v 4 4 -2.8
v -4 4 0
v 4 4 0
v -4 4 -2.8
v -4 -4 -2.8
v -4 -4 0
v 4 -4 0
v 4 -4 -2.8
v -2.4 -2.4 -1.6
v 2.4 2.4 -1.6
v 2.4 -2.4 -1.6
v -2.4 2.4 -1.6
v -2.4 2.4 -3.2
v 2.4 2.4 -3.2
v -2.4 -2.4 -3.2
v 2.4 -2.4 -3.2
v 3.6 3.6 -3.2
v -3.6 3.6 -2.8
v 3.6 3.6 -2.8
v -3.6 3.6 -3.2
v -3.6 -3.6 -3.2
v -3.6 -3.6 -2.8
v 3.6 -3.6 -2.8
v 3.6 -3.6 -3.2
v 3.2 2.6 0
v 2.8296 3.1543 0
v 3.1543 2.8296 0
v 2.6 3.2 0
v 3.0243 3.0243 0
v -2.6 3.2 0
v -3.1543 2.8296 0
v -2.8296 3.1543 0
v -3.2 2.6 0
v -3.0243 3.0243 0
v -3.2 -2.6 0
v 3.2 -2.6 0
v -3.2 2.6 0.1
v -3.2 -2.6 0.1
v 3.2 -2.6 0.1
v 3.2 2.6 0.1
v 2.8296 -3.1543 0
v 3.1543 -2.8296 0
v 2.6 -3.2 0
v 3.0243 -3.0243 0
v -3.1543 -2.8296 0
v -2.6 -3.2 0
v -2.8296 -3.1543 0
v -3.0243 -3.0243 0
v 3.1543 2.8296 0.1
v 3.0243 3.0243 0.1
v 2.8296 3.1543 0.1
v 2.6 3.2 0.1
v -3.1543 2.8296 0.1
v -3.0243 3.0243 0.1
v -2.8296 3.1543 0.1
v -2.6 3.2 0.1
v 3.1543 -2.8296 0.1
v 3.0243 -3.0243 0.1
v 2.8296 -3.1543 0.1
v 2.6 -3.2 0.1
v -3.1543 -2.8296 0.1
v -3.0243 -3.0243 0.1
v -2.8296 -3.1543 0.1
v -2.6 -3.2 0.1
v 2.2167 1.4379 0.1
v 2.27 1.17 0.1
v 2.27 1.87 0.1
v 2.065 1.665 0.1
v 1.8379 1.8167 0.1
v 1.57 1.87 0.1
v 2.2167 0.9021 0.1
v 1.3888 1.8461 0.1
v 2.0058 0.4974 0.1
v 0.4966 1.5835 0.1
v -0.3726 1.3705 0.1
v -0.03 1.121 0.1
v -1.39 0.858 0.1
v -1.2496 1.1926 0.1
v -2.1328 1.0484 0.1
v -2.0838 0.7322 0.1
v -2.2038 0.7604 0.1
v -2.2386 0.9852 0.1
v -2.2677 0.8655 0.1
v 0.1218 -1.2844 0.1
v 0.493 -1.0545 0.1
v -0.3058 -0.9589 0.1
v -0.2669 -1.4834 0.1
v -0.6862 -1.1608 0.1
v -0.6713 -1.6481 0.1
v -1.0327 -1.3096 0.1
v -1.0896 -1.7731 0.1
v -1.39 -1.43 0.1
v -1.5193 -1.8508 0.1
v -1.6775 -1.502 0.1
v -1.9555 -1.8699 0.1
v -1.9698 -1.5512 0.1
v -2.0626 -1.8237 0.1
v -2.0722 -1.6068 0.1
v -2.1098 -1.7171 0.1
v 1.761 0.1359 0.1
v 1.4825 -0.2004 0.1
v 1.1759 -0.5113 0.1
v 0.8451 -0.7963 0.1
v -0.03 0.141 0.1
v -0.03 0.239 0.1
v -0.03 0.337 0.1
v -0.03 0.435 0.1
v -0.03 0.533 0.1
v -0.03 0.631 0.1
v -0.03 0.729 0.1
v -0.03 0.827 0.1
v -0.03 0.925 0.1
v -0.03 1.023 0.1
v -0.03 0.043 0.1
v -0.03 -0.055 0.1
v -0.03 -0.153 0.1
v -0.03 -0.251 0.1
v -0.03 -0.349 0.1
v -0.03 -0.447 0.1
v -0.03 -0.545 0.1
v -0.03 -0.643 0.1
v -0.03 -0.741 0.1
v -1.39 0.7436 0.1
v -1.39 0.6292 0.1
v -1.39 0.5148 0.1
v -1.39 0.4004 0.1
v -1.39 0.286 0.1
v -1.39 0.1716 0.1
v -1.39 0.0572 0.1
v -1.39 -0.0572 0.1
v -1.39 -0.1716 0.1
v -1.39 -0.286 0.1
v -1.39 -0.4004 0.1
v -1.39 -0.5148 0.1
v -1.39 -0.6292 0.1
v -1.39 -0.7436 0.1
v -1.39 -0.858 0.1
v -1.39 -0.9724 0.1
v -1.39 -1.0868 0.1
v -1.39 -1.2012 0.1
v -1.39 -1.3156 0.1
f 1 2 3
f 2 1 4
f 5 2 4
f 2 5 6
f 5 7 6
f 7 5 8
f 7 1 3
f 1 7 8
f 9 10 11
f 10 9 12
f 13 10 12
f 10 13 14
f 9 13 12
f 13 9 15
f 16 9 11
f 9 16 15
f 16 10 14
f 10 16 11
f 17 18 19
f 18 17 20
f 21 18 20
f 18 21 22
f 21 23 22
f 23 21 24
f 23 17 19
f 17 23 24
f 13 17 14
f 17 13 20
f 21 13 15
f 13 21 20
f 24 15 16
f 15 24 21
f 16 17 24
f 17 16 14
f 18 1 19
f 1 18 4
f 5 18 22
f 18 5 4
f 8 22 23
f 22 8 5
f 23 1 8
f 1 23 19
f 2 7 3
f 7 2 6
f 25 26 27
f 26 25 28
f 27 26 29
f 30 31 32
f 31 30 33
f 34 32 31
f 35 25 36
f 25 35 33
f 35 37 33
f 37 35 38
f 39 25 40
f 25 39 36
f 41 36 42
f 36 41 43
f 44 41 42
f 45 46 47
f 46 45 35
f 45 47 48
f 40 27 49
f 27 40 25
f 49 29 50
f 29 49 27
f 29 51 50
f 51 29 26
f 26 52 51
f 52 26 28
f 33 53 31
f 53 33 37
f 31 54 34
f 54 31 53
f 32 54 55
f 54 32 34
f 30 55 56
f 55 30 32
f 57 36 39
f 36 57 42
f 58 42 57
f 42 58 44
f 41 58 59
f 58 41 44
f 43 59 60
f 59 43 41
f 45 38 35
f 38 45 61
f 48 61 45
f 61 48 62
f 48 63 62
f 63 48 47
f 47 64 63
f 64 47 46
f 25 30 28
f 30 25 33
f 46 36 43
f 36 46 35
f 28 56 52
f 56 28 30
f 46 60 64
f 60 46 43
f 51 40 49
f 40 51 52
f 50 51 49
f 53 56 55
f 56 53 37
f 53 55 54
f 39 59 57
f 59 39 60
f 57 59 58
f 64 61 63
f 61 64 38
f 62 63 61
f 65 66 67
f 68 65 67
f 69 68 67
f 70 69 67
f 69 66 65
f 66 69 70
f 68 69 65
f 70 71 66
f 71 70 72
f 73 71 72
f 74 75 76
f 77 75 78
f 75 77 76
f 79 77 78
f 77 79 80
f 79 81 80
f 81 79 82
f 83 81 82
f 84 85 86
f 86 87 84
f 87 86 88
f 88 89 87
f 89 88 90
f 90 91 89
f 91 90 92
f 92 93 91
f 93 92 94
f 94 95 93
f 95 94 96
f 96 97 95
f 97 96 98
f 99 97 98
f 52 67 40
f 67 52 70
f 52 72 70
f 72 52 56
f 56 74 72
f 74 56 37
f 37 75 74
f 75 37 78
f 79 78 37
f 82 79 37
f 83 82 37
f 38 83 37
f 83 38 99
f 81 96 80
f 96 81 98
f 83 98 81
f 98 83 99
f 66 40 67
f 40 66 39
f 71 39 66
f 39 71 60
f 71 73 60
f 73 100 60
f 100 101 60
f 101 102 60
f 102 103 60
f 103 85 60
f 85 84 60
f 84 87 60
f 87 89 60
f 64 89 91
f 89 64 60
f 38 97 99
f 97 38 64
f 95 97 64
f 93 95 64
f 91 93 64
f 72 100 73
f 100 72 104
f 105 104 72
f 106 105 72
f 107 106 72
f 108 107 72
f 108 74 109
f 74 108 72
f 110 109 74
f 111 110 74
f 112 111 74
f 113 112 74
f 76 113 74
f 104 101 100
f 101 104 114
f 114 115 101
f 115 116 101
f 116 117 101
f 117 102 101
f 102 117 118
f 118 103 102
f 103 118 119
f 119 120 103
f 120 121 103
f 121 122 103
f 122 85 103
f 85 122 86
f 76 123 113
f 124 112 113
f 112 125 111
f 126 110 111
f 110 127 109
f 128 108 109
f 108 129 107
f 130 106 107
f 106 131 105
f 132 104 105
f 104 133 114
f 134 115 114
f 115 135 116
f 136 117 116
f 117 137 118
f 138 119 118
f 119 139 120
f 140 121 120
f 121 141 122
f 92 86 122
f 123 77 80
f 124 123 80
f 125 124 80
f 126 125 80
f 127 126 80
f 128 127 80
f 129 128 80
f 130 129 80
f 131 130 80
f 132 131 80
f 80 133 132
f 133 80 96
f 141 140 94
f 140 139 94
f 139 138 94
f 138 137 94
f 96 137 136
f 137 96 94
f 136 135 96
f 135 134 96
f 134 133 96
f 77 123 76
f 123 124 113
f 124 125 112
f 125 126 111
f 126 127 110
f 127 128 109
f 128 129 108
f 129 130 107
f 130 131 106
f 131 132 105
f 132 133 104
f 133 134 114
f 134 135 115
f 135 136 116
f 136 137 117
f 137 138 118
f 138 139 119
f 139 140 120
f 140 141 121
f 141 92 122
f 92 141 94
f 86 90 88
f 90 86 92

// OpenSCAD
// file: ../p/box3u12.scad
use <../lib.scad>
function ldraw_lib__box3u12() = [
// 0 Box with 3 Parallel Faces without Any Edges
// 0 Name: box3u12.dat
// 0 Author: J.C. Tchang [tchang]
// 0 !LDRAW_ORG Primitive UPDATE 2014-02
// 0 !LICENSE Licensed under CC BY 4.0 : see CAreadme.txt
// 
// 0 BFC CERTIFY CCW
  [0,"BFC","CERTIFY"],
  [0,"BFC","CCW"],
// 
// 0 !HISTORY 2014-12-23 [PTadmin] Official Update 2014-02
// 
// 
// 4 16 -1 1 1 1 1 1 1 1 -1 -1 1 -1
  [4,16,-1,1,1,1,1,1,1,1,-1,-1,1,-1],
// 4 16 -1 1 1 -1 0 1 1 0 1 1 1 1
  [4,16,-1,1,1,-1,0,1,1,0,1,1,1,1],
// 4 16 1 1 -1 1 0 -1 -1 0 -1 -1 1 -1
  [4,16,1,1,-1,1,0,-1,-1,0,-1,-1,1,-1],
];
module ldraw_lib__box3u12(step=0, col=false, unit=2/5, alt=false, line=0.2, solid=!$preview)
    makepoly(ldraw_lib__box3u12(), step=step, col=col, unit=unit, alt=alt, line=line, solid=solid);
ldraw_lib__box3u12(line=0.2);
// file: ../p/1-4cyli.scad
use <../lib.scad>
function ldraw_lib__1_4cyli() = [
// 0 Cylinder 0.25
// 0 Name: 1-4cyli.dat
// 0 Author: James Jessiman
// 0 !LDRAW_ORG Primitive UPDATE 2012-01
// 0 !LICENSE Licensed under CC BY 4.0 : see CAreadme.txt
// 
// 0 BFC CERTIFY CCW
  [0,"BFC","CERTIFY"],
  [0,"BFC","CCW"],
// 
// 0 !HISTORY 2002-03-23 [sbliss] Added BFC statement.
// 0 !HISTORY 2002-04-25 [PTadmin] Official Update 2002-02
// 0 !HISTORY 2007-06-22 [PTadmin] Header formatted for Contributor Agreement
// 0 !HISTORY 2008-07-01 [PTadmin] Official Update 2008-01
// 0 !HISTORY 2012-02-16 [Philo] Changed to CCW
// 0 !HISTORY 2012-03-30 [PTadmin] Official Update 2012-01
// 
// 
// 4 16 1 1 0 0.9239 1 0.3827 0.9239 0 0.3827 1 0 0
  [4,16,1,1,0,0.9239,1,0.3827,0.9239,0,0.3827,1,0,0],
// 5 24 1 0 0 1 1 0 0.9239 0 0.3827 1 0 -1
  [5,24,1,0,0,1,1,0,0.9239,0,0.3827,1,0,-1],
// 4 16 0.9239 1 0.3827 0.7071 1 0.7071 0.7071 0 0.7071 0.9239 0 0.3827
  [4,16,0.9239,1,0.3827,0.7071,1,0.7071,0.7071,0,0.7071,0.9239,0,0.3827],
// 5 24 0.9239 0 0.3827 0.9239 1 0.3827 0.7071 0 0.7071 1 0 0
  [5,24,0.9239,0,0.3827,0.9239,1,0.3827,0.7071,0,0.7071,1,0,0],
// 4 16 0.7071 1 0.7071 0.3827 1 0.9239 0.3827 0 0.9239 0.7071 0 0.7071
  [4,16,0.7071,1,0.7071,0.3827,1,0.9239,0.3827,0,0.9239,0.7071,0,0.7071],
// 5 24 0.7071 0 0.7071 0.7071 1 0.7071 0.3827 0 0.9239 0.9239 0 0.3827
  [5,24,0.7071,0,0.7071,0.7071,1,0.7071,0.3827,0,0.9239,0.9239,0,0.3827],
// 4 16 0.3827 1 0.9239 0 1 1 0 0 1 0.3827 0 0.9239
  [4,16,0.3827,1,0.9239,0,1,1,0,0,1,0.3827,0,0.9239],
// 5 24 0.3827 0 0.9239 0.3827 1 0.9239 0 0 1 0.7071 0 0.7071
  [5,24,0.3827,0,0.9239,0.3827,1,0.9239,0,0,1,0.7071,0,0.7071],
// 5 24 0 0 1 0 1 1 0.3827 0 0.9239 -1 0 1
  [5,24,0,0,1,0,1,1,0.3827,0,0.9239,-1,0,1],
];
module ldraw_lib__1_4cyli(step=0, col=false, unit=2/5, alt=false, line=0.2, solid=!$preview)
    makepoly(ldraw_lib__1_4cyli(), step=step, col=col, unit=unit, alt=alt, line=line, solid=solid);
ldraw_lib__1_4cyli(line=0.2);
// file: s/stickerback008x008.scad
use <../../lib.scad>
use <../../p/1-4chrd.scad>
use <../../p/1-4cyli.scad>
use <../../p/box3u12.scad>
function ldraw_lib__s__stickerback008x008() = [
// 0 ~Sticker Back  0.8 x  0.8
// 0 Name: s\stickerback008x008.dat
// 0 Author: Massimo Maso [Sirio]
// 0 !LDRAW_ORG Subpart UPDATE 2025-08
// 0 !LICENSE Licensed under CC BY 4.0 : see CAreadme.txt
// 
// 0 BFC CERTIFY CCW
  [0,"BFC","CERTIFY"],
  [0,"BFC","CCW"],
// 
// 0 !HISTORY 2025-08-31 [OrionP] Official Update 2025-08
// 
// 0 // Primitives
// 1 16 -6.5 0 6.5 -1.5 0 0 0 -1 0 0 0 1.5 1-4chrd.dat
  [1,16,-6.5,0,6.5,-1.5,0,0,0,-1,0,0,0,1.5, ldraw_lib__1_4chrd()],
// 1 16 6.5 0 6.5 1.5 0 0 0 -1 0 0 0 1.5 1-4chrd.dat
  [1,16,6.5,0,6.5,1.5,0,0,0,-1,0,0,0,1.5, ldraw_lib__1_4chrd()],
// 1 16 0 -.25 0 0 0 8 0 .25 0 6.5 0 0 box3u12.dat
  [1,16,0,-.25,0,0,0,8,0,.25,0,6.5,0,0, ldraw_lib__box3u12()],
// 1 16 -6.5 0 -6.5 -1.5 0 0 0 -1 0 0 0 -1.5 1-4chrd.dat
  [1,16,-6.5,0,-6.5,-1.5,0,0,0,-1,0,0,0,-1.5, ldraw_lib__1_4chrd()],
// 1 16 6.5 0 -6.5 1.5 0 0 0 -1 0 0 0 -1.5 1-4chrd.dat
  [1,16,6.5,0,-6.5,1.5,0,0,0,-1,0,0,0,-1.5, ldraw_lib__1_4chrd()],
// 1 16 -6.5 0 6.5 -1.5 0 0 0 -.25 0 0 0 1.5 1-4cyli.dat
  [1,16,-6.5,0,6.5,-1.5,0,0,0,-.25,0,0,0,1.5, ldraw_lib__1_4cyli()],
// 1 16 6.5 0 6.5 1.5 0 0 0 -.25 0 0 0 1.5 1-4cyli.dat
  [1,16,6.5,0,6.5,1.5,0,0,0,-.25,0,0,0,1.5, ldraw_lib__1_4cyli()],
// 1 16 -6.5 0 -6.5 -1.5 0 0 0 -.25 0 0 0 -1.5 1-4cyli.dat
  [1,16,-6.5,0,-6.5,-1.5,0,0,0,-.25,0,0,0,-1.5, ldraw_lib__1_4cyli()],
// 1 16 6.5 0 -6.5 1.5 0 0 0 -.25 0 0 0 -1.5 1-4cyli.dat
  [1,16,6.5,0,-6.5,1.5,0,0,0,-.25,0,0,0,-1.5, ldraw_lib__1_4cyli()],
// 0 // Bottom faces
// 4 16 -8 0 6.5 -6.5 0 8 6.5 0 8 8 0 6.5
  [4,16,-8,0,6.5,-6.5,0,8,6.5,0,8,8,0,6.5],
// 4 16 -8 0 -6.5 8 0 -6.5 6.5 0 -8 -6.5 0 -8
  [4,16,-8,0,-6.5,8,0,-6.5,6.5,0,-8,-6.5,0,-8],
// 0 // Lateral faces
// 4 16 -6.5 0 8 -6.5 -.25 8 6.5 -.25 8 6.5 0 8
  [4,16,-6.5,0,8,-6.5,-.25,8,6.5,-.25,8,6.5,0,8],
// 4 16 -6.5 0 -8 6.5 0 -8 6.5 -.25 -8 -6.5 -.25 -8
  [4,16,-6.5,0,-8,6.5,0,-8,6.5,-.25,-8,-6.5,-.25,-8],
];
module ldraw_lib__s__stickerback008x008(step=0, col=false, unit=2/5, alt=false, line=0.2, solid=!$preview)
    makepoly(ldraw_lib__s__stickerback008x008(), step=step, col=col, unit=unit, alt=alt, line=line, solid=solid);
ldraw_lib__s__stickerback008x008(line=0.2);
// file: ../p/1-4ndis.scad
use <../lib.scad>
function ldraw_lib__1_4ndis() = [
// 0 Disc Negative 0.25
// 0 Name: 1-4ndis.dat
// 0 Author: James Jessiman
// 0 !LDRAW_ORG Primitive UPDATE 2012-01
// 0 !LICENSE Licensed under CC BY 4.0 : see CAreadme.txt
// 
// 0 BFC CERTIFY CCW
  [0,"BFC","CERTIFY"],
  [0,"BFC","CCW"],
// 
// 0 !HISTORY 2002-03-23 [sbliss] Added BFC Statement
// 0 !HISTORY 2002-04-25 [PTadmin] Official Update 2002-02
// 0 !HISTORY 2007-06-22 [PTadmin] Header formatted for Contributor Agreement
// 0 !HISTORY 2008-07-01 [PTadmin] Official Update 2008-01
// 0 !HISTORY 2012-02-16 [Philo] Changed to CCW
// 0 !HISTORY 2012-03-30 [PTadmin] Official Update 2012-01
// 
// 
// 3 16 0.9239 0 0.3827 1 0 0 1 0 1
  [3,16,0.9239,0,0.3827,1,0,0,1,0,1],
// 3 16 0.7071 0 0.7071 0.9239 0 0.3827 1 0 1
  [3,16,0.7071,0,0.7071,0.9239,0,0.3827,1,0,1],
// 3 16 0.3827 0 0.9239 0.7071 0 0.7071 1 0 1
  [3,16,0.3827,0,0.9239,0.7071,0,0.7071,1,0,1],
// 3 16 0 0 1 0.3827 0 0.9239 1 0 1
  [3,16,0,0,1,0.3827,0,0.9239,1,0,1],
];
module ldraw_lib__1_4ndis(step=0, col=false, unit=2/5, alt=false, line=0.2, solid=!$preview)
    makepoly(ldraw_lib__1_4ndis(), step=step, col=col, unit=unit, alt=alt, line=line, solid=solid);
ldraw_lib__1_4ndis(line=0.2);
// file: ../p/1-4chrd.scad
use <../lib.scad>
function ldraw_lib__1_4chrd() = [
// 0 Chord 0.25
// 0 Name: 1-4chrd.dat
// 0 Author: Max Martin Richter [MMR1988]
// 0 !LDRAW_ORG Primitive UPDATE 2023-05
// 0 !LICENSE Licensed under CC BY 4.0 : see CAreadme.txt
// 
// 0 BFC CERTIFY CCW
  [0,"BFC","CERTIFY"],
  [0,"BFC","CCW"],
// 
// 0 !HISTORY 2004-04-22 [PTadmin] Official Update 2004-02
// 0 !HISTORY 2007-10-09 [PTadmin] Header formatted for Contributor Agreement
// 0 !HISTORY 2008-07-01 [PTadmin] Official Update 2008-01
// 0 !HISTORY 2012-08-02 [MMR1988] Re-creation with PrimGen2 and Rectifier
// 0 !HISTORY 2012-08-09 [PTadmin] Official Update 2012-02
// 0 !HISTORY 2023-10-27 [OrionP] Change author to MMR1988 from hafhead
// 0 !HISTORY 2023-10-31 [OrionP] Official Update 2023-05
// 
// 4 16 0.9239 0 0.3827 0.3827 0 0.9239 0 0 1 1 0 0
  [4,16,0.9239,0,0.3827,0.3827,0,0.9239,0,0,1,1,0,0],
// 3 16 0.7071 0 0.7071 0.3827 0 0.9239 0.9239 0 0.3827
  [3,16,0.7071,0,0.7071,0.3827,0,0.9239,0.9239,0,0.3827],
];
module ldraw_lib__1_4chrd(step=0, col=false, unit=2/5, alt=false, line=0.2, solid=!$preview)
    makepoly(ldraw_lib__1_4chrd(), step=step, col=col, unit=unit, alt=alt, line=line, solid=solid);
ldraw_lib__1_4chrd(line=0.2);
// file: ../p/box5.scad
use <../lib.scad>
function ldraw_lib__box5() = [
// 0 Box with 5 Faces and All Edges
// 0 Name: box5.dat
// 0 Author: James Jessiman
// 0 !LDRAW_ORG Primitive UPDATE 2012-01
// 0 !LICENSE Licensed under CC BY 4.0 : see CAreadme.txt
// 
// 0 BFC CERTIFY CCW
  [0,"BFC","CERTIFY"],
  [0,"BFC","CCW"],
// 
// 0 !HISTORY 2002-04-03 [sbliss] Modified for BFC compliance
// 0 !HISTORY 2002-04-25 [PTadmin] Official Update 2002-02
// 0 !HISTORY 2007-06-24 [PTadmin] Header formatted for Contributor Agreement
// 0 !HISTORY 2008-07-01 [PTadmin] Official Update 2008-01
// 0 !HISTORY 2012-02-16 [Philo] Changed to CCW
// 0 !HISTORY 2012-03-30 [PTadmin] Official Update 2012-01
// 
// 
// 2 24 1 1 1 -1 1 1
  [2,24,1,1,1,-1,1,1],
// 2 24 -1 1 1 -1 1 -1
  [2,24,-1,1,1,-1,1,-1],
// 2 24 -1 1 -1 1 1 -1
  [2,24,-1,1,-1,1,1,-1],
// 2 24 1 1 -1 1 1 1
  [2,24,1,1,-1,1,1,1],
// 2 24 1 0 1 -1 0 1
  [2,24,1,0,1,-1,0,1],
// 2 24 -1 0 1 -1 0 -1
  [2,24,-1,0,1,-1,0,-1],
// 2 24 -1 0 -1 1 0 -1
  [2,24,-1,0,-1,1,0,-1],
// 2 24 1 0 -1 1 0 1
  [2,24,1,0,-1,1,0,1],
// 2 24 1 0 1 1 1 1
  [2,24,1,0,1,1,1,1],
// 2 24 -1 0 1 -1 1 1
  [2,24,-1,0,1,-1,1,1],
// 2 24 1 0 -1 1 1 -1
  [2,24,1,0,-1,1,1,-1],
// 2 24 -1 0 -1 -1 1 -1
  [2,24,-1,0,-1,-1,1,-1],
// 4 16 -1 1 1 1 1 1 1 1 -1 -1 1 -1
  [4,16,-1,1,1,1,1,1,1,1,-1,-1,1,-1],
// 4 16 -1 1 1 -1 0 1 1 0 1 1 1 1
  [4,16,-1,1,1,-1,0,1,1,0,1,1,1,1],
// 4 16 -1 1 -1 -1 0 -1 -1 0 1 -1 1 1
  [4,16,-1,1,-1,-1,0,-1,-1,0,1,-1,1,1],
// 4 16 1 1 -1 1 0 -1 -1 0 -1 -1 1 -1
  [4,16,1,1,-1,1,0,-1,-1,0,-1,-1,1,-1],
// 4 16 1 1 1 1 0 1 1 0 -1 1 1 -1
  [4,16,1,1,1,1,0,1,1,0,-1,1,1,-1],
];
module ldraw_lib__box5(step=0, col=false, unit=2/5, alt=false, line=0.2, solid=!$preview)
    makepoly(ldraw_lib__box5(), step=step, col=col, unit=unit, alt=alt, line=line, solid=solid);
ldraw_lib__box5(line=0.2);
// file: ../p/box4.scad
use <../lib.scad>
function ldraw_lib__box4() = [
// 0 Box with 4 Faces (2 Parallel Pairs) and All Edges
// 0 Name: box4.dat
// 0 Author: James Jessiman
// 0 !LDRAW_ORG Primitive UPDATE 2012-01
// 0 !LICENSE Licensed under CC BY 4.0 : see CAreadme.txt
// 
// 0 BFC CERTIFY CCW
  [0,"BFC","CERTIFY"],
  [0,"BFC","CCW"],
// 
// 0 !HISTORY 2002-04-03 [sbliss] Modified for BFC compliance
// 0 !HISTORY 2002-04-25 [PTadmin] Official Update 2002-02
// 0 !HISTORY 2007-06-24 [PTadmin] Header formatted for Contributor Agreement
// 0 !HISTORY 2008-07-01 [PTadmin] Official Update 2008-01
// 0 !HISTORY 2012-02-16 [Philo] Changed to CCW
// 0 !HISTORY 2012-03-30 [PTadmin] Official Update 2012-01
// 
// 
// 2 24 1 1 1 -1 1 1
  [2,24,1,1,1,-1,1,1],
// 2 24 -1 1 1 -1 1 -1
  [2,24,-1,1,1,-1,1,-1],
// 2 24 -1 1 -1 1 1 -1
  [2,24,-1,1,-1,1,1,-1],
// 2 24 1 1 -1 1 1 1
  [2,24,1,1,-1,1,1,1],
// 2 24 1 0 1 -1 0 1
  [2,24,1,0,1,-1,0,1],
// 2 24 -1 0 1 -1 0 -1
  [2,24,-1,0,1,-1,0,-1],
// 2 24 -1 0 -1 1 0 -1
  [2,24,-1,0,-1,1,0,-1],
// 2 24 1 0 -1 1 0 1
  [2,24,1,0,-1,1,0,1],
// 2 24 1 0 1 1 1 1
  [2,24,1,0,1,1,1,1],
// 2 24 -1 0 1 -1 1 1
  [2,24,-1,0,1,-1,1,1],
// 2 24 1 0 -1 1 1 -1
  [2,24,1,0,-1,1,1,-1],
// 2 24 -1 0 -1 -1 1 -1
  [2,24,-1,0,-1,-1,1,-1],
// 4 16 -1 1 1 -1 0 1 1 0 1 1 1 1
  [4,16,-1,1,1,-1,0,1,1,0,1,1,1,1],
// 4 16 -1 1 -1 -1 0 -1 -1 0 1 -1 1 1
  [4,16,-1,1,-1,-1,0,-1,-1,0,1,-1,1,1],
// 4 16 1 1 -1 1 0 -1 -1 0 -1 -1 1 -1
  [4,16,1,1,-1,1,0,-1,-1,0,-1,-1,1,-1],
// 4 16 1 1 1 1 0 1 1 0 -1 1 1 -1
  [4,16,1,1,1,1,0,1,1,0,-1,1,1,-1],
];
module ldraw_lib__box4(step=0, col=false, unit=2/5, alt=false, line=0.2, solid=!$preview)
    makepoly(ldraw_lib__box4(), step=step, col=col, unit=unit, alt=alt, line=line, solid=solid);
ldraw_lib__box4(line=0.2);
// file: s/3070bs01.scad
use <../../lib.scad>
use <../../p/box4.scad>
use <../../p/box5.scad>
function ldraw_lib__s__3070bs01() = [
// 0 ~Tile  1 x  1 with Groove without Top Face
// 0 Name: s\3070bs01.dat
// 0 Author: Chris Dee [cwdee]
// 0 !LDRAW_ORG Subpart UPDATE 2009-02
// 0 !LICENSE Licensed under CC BY 4.0 : see CAreadme.txt
// 
// 0 BFC CERTIFY CCW
  [0,"BFC","CERTIFY"],
  [0,"BFC","CCW"],
// 
// 0 !HISTORY 2009-09-03 [PTadmin] Official Update 2009-02
// 
// 
// 1 16 0 0 0 10 0 0 0 7 0 0 0 10 box4.dat
  [1,16,0,0,0,10,0,0,0,7,0,0,0,10, ldraw_lib__box4()],
// 0 BFC INVERTNEXT
  [0,"BFC","INVERTNEXT"],
// 1 16 0 8 0 6 0 0 0 -4 0 0 0 6 box5.dat
  [1,16,0,8,0,6,0,0,0,-4,0,0,0,6, ldraw_lib__box5()],
// 1 16 0 7 0 9 0 0 0 1 0 0 0 9 box4.dat
  [1,16,0,7,0,9,0,0,0,1,0,0,0,9, ldraw_lib__box4()],
// 
// 4 16 9 8 9 6 8 6 -6 8 6 -9 8 9
  [4,16,9,8,9,6,8,6,-6,8,6,-9,8,9],
// 4 16 -9 8 9 -6 8 6 -6 8 -6 -9 8 -9
  [4,16,-9,8,9,-6,8,6,-6,8,-6,-9,8,-9],
// 4 16 -9 8 -9 -6 8 -6 6 8 -6 9 8 -9
  [4,16,-9,8,-9,-6,8,-6,6,8,-6,9,8,-9],
// 4 16 9 8 -9 6 8 -6 6 8 6 9 8 9
  [4,16,9,8,-9,6,8,-6,6,8,6,9,8,9],
// 
// 4 16 10 7 10 9 7 9 -9 7 9 -10 7 10
  [4,16,10,7,10,9,7,9,-9,7,9,-10,7,10],
// 4 16 -10 7 10 -9 7 9 -9 7 -9 -10 7 -10
  [4,16,-10,7,10,-9,7,9,-9,7,-9,-10,7,-10],
// 4 16 -10 7 -10 -9 7 -9 9 7 -9 10 7 -10
  [4,16,-10,7,-10,-9,7,-9,9,7,-9,10,7,-10],
// 4 16 10 7 -10 9 7 -9 9 7 9 10 7 10
  [4,16,10,7,-10,9,7,-9,9,7,9,10,7,10],
// 0
];
module ldraw_lib__s__3070bs01(step=0, col=false, unit=2/5, alt=false, line=0.2, solid=!$preview)
    makepoly(ldraw_lib__s__3070bs01(), step=step, col=col, unit=unit, alt=alt, line=line, solid=solid);
ldraw_lib__s__3070bs01(line=0.2);
// file: 6177960j.scad
use <../lib.scad>
use <6177960g.scad>
function ldraw_lib__6177960j() = [
// 0 Sticker  0.8 x  0.8 with Black Air Vent on Orange Background Left
// 0 Name: 6177960j.dat
// 0 Author: Massimo Maso [Sirio]
// 0 !LDRAW_ORG Part UPDATE 2025-08
// 0 !LICENSE Licensed under CC BY 4.0 : see CAreadme.txt
// 
// 0 BFC CERTIFY CCW
  [0,"BFC","CERTIFY"],
  [0,"BFC","CCW"],
// 
// 0 !KEYWORDS 720S, McLaren, Set 75880, Speed Champions
// 
// 0 !HISTORY 2025-08-31 [OrionP] Official Update 2025-08
// 
// 
// 1 16 0 0 0 -1 0 0 0 1 0 0 0 1 6177960g.dat
  [1,16,0,0,0,-1,0,0,0,1,0,0,0,1, ldraw_lib__6177960g()],
];
module ldraw_lib__6177960j(step=0, col=false, unit=2/5, alt=false, line=0.2, solid=!$preview)
    makepoly(ldraw_lib__6177960j(), step=step, col=col, unit=unit, alt=alt, line=line, solid=solid);
ldraw_lib__6177960j(line=0.2);
// file: 3070b.scad
use <../lib.scad>
use <s/3070bs01.scad>
function ldraw_lib__3070b() = [
// 0 Tile  1 x  1 with Groove
// 0 Name: 3070b.dat
// 0 Author: Chris Dee [cwdee]
// 0 !LDRAW_ORG Part UPDATE 2025-09
// 0 !LICENSE Licensed under CC BY 4.0 : see CAreadme.txt
// 
// 0 BFC CERTIFY CCW
  [0,"BFC","CERTIFY"],
  [0,"BFC","CCW"],
// 
// 0 !KEYWORDS BrickLink 3070
// 
// 0 !HISTORY 2009-09-03 [PTadmin] Official Update 2009-02
// 0 !HISTORY 2025-09-27 [OrionP] Changed winding to CCW
// 0 !HISTORY 2025-09-29 [OrionP] Official Update 2025-09
// 
// 1 16 0 0 0 1 0 0 0 1 0 0 0 1 s\3070bs01.dat
  [1,16,0,0,0,1,0,0,0,1,0,0,0,1, ldraw_lib__s__3070bs01()],
// 4 16 -10 0 10 -10 0 -10 10 0 -10 10 0 10
  [4,16,-10,0,10,-10,0,-10,10,0,-10,10,0,10],
// 0
];
module ldraw_lib__3070b(step=0, col=false, unit=2/5, alt=false, line=0.2, solid=!$preview)
    makepoly(ldraw_lib__3070b(), step=step, col=col, unit=unit, alt=alt, line=line, solid=solid);
ldraw_lib__3070b(line=0.2);
// main file
use <../lib.scad>
use <3070b.scad>
use <6177960j.scad>
function ldraw_lib__3070bd0b() = [
// 0 Tile  1 x  1 with Black Air Vent on Orange Background Left Sticker
// 0 Name: 3070bd0b.dat
// 0 Author: Vincent Messenet [Cheenzo]
// 0 !LDRAW_ORG Shortcut UPDATE 2026-06
// 0 !LICENSE Licensed under CC BY 4.0 : see CAreadme.txt
// 
// 0 BFC CERTIFY CCW
  [0,"BFC","CERTIFY"],
  [0,"BFC","CCW"],
// 
// 0 !CATEGORY Sticker Shortcut
// 
// 0 !KEYWORDS 720S, Bricklink 3070pb360L, McLaren, Set 75880, Speed Champions
// 
// 0 !HISTORY 2026-06-28 [OrionP] Official Update 2026-06
// 
// 1 16 0 0 0 1 0 0 0 1 0 0 0 1 3070b.dat
  [1,16,0,0,0,1,0,0,0,1,0,0,0,1, ldraw_lib__3070b()],
// 1 16 0 0 0 1 0 0 0 1 0 0 0 1 6177960j.dat
  [1,16,0,0,0,1,0,0,0,1,0,0,0,1, ldraw_lib__6177960j()],
];
module ldraw_lib__3070bd0b(step=0, col=false, unit=2/5, alt=false, line=0.2, solid=!$preview)
    makepoly(ldraw_lib__3070bd0b(), step=step, col=col, unit=unit, alt=alt, line=line, solid=solid);
ldraw_lib__3070bd0b(line=0.2);
